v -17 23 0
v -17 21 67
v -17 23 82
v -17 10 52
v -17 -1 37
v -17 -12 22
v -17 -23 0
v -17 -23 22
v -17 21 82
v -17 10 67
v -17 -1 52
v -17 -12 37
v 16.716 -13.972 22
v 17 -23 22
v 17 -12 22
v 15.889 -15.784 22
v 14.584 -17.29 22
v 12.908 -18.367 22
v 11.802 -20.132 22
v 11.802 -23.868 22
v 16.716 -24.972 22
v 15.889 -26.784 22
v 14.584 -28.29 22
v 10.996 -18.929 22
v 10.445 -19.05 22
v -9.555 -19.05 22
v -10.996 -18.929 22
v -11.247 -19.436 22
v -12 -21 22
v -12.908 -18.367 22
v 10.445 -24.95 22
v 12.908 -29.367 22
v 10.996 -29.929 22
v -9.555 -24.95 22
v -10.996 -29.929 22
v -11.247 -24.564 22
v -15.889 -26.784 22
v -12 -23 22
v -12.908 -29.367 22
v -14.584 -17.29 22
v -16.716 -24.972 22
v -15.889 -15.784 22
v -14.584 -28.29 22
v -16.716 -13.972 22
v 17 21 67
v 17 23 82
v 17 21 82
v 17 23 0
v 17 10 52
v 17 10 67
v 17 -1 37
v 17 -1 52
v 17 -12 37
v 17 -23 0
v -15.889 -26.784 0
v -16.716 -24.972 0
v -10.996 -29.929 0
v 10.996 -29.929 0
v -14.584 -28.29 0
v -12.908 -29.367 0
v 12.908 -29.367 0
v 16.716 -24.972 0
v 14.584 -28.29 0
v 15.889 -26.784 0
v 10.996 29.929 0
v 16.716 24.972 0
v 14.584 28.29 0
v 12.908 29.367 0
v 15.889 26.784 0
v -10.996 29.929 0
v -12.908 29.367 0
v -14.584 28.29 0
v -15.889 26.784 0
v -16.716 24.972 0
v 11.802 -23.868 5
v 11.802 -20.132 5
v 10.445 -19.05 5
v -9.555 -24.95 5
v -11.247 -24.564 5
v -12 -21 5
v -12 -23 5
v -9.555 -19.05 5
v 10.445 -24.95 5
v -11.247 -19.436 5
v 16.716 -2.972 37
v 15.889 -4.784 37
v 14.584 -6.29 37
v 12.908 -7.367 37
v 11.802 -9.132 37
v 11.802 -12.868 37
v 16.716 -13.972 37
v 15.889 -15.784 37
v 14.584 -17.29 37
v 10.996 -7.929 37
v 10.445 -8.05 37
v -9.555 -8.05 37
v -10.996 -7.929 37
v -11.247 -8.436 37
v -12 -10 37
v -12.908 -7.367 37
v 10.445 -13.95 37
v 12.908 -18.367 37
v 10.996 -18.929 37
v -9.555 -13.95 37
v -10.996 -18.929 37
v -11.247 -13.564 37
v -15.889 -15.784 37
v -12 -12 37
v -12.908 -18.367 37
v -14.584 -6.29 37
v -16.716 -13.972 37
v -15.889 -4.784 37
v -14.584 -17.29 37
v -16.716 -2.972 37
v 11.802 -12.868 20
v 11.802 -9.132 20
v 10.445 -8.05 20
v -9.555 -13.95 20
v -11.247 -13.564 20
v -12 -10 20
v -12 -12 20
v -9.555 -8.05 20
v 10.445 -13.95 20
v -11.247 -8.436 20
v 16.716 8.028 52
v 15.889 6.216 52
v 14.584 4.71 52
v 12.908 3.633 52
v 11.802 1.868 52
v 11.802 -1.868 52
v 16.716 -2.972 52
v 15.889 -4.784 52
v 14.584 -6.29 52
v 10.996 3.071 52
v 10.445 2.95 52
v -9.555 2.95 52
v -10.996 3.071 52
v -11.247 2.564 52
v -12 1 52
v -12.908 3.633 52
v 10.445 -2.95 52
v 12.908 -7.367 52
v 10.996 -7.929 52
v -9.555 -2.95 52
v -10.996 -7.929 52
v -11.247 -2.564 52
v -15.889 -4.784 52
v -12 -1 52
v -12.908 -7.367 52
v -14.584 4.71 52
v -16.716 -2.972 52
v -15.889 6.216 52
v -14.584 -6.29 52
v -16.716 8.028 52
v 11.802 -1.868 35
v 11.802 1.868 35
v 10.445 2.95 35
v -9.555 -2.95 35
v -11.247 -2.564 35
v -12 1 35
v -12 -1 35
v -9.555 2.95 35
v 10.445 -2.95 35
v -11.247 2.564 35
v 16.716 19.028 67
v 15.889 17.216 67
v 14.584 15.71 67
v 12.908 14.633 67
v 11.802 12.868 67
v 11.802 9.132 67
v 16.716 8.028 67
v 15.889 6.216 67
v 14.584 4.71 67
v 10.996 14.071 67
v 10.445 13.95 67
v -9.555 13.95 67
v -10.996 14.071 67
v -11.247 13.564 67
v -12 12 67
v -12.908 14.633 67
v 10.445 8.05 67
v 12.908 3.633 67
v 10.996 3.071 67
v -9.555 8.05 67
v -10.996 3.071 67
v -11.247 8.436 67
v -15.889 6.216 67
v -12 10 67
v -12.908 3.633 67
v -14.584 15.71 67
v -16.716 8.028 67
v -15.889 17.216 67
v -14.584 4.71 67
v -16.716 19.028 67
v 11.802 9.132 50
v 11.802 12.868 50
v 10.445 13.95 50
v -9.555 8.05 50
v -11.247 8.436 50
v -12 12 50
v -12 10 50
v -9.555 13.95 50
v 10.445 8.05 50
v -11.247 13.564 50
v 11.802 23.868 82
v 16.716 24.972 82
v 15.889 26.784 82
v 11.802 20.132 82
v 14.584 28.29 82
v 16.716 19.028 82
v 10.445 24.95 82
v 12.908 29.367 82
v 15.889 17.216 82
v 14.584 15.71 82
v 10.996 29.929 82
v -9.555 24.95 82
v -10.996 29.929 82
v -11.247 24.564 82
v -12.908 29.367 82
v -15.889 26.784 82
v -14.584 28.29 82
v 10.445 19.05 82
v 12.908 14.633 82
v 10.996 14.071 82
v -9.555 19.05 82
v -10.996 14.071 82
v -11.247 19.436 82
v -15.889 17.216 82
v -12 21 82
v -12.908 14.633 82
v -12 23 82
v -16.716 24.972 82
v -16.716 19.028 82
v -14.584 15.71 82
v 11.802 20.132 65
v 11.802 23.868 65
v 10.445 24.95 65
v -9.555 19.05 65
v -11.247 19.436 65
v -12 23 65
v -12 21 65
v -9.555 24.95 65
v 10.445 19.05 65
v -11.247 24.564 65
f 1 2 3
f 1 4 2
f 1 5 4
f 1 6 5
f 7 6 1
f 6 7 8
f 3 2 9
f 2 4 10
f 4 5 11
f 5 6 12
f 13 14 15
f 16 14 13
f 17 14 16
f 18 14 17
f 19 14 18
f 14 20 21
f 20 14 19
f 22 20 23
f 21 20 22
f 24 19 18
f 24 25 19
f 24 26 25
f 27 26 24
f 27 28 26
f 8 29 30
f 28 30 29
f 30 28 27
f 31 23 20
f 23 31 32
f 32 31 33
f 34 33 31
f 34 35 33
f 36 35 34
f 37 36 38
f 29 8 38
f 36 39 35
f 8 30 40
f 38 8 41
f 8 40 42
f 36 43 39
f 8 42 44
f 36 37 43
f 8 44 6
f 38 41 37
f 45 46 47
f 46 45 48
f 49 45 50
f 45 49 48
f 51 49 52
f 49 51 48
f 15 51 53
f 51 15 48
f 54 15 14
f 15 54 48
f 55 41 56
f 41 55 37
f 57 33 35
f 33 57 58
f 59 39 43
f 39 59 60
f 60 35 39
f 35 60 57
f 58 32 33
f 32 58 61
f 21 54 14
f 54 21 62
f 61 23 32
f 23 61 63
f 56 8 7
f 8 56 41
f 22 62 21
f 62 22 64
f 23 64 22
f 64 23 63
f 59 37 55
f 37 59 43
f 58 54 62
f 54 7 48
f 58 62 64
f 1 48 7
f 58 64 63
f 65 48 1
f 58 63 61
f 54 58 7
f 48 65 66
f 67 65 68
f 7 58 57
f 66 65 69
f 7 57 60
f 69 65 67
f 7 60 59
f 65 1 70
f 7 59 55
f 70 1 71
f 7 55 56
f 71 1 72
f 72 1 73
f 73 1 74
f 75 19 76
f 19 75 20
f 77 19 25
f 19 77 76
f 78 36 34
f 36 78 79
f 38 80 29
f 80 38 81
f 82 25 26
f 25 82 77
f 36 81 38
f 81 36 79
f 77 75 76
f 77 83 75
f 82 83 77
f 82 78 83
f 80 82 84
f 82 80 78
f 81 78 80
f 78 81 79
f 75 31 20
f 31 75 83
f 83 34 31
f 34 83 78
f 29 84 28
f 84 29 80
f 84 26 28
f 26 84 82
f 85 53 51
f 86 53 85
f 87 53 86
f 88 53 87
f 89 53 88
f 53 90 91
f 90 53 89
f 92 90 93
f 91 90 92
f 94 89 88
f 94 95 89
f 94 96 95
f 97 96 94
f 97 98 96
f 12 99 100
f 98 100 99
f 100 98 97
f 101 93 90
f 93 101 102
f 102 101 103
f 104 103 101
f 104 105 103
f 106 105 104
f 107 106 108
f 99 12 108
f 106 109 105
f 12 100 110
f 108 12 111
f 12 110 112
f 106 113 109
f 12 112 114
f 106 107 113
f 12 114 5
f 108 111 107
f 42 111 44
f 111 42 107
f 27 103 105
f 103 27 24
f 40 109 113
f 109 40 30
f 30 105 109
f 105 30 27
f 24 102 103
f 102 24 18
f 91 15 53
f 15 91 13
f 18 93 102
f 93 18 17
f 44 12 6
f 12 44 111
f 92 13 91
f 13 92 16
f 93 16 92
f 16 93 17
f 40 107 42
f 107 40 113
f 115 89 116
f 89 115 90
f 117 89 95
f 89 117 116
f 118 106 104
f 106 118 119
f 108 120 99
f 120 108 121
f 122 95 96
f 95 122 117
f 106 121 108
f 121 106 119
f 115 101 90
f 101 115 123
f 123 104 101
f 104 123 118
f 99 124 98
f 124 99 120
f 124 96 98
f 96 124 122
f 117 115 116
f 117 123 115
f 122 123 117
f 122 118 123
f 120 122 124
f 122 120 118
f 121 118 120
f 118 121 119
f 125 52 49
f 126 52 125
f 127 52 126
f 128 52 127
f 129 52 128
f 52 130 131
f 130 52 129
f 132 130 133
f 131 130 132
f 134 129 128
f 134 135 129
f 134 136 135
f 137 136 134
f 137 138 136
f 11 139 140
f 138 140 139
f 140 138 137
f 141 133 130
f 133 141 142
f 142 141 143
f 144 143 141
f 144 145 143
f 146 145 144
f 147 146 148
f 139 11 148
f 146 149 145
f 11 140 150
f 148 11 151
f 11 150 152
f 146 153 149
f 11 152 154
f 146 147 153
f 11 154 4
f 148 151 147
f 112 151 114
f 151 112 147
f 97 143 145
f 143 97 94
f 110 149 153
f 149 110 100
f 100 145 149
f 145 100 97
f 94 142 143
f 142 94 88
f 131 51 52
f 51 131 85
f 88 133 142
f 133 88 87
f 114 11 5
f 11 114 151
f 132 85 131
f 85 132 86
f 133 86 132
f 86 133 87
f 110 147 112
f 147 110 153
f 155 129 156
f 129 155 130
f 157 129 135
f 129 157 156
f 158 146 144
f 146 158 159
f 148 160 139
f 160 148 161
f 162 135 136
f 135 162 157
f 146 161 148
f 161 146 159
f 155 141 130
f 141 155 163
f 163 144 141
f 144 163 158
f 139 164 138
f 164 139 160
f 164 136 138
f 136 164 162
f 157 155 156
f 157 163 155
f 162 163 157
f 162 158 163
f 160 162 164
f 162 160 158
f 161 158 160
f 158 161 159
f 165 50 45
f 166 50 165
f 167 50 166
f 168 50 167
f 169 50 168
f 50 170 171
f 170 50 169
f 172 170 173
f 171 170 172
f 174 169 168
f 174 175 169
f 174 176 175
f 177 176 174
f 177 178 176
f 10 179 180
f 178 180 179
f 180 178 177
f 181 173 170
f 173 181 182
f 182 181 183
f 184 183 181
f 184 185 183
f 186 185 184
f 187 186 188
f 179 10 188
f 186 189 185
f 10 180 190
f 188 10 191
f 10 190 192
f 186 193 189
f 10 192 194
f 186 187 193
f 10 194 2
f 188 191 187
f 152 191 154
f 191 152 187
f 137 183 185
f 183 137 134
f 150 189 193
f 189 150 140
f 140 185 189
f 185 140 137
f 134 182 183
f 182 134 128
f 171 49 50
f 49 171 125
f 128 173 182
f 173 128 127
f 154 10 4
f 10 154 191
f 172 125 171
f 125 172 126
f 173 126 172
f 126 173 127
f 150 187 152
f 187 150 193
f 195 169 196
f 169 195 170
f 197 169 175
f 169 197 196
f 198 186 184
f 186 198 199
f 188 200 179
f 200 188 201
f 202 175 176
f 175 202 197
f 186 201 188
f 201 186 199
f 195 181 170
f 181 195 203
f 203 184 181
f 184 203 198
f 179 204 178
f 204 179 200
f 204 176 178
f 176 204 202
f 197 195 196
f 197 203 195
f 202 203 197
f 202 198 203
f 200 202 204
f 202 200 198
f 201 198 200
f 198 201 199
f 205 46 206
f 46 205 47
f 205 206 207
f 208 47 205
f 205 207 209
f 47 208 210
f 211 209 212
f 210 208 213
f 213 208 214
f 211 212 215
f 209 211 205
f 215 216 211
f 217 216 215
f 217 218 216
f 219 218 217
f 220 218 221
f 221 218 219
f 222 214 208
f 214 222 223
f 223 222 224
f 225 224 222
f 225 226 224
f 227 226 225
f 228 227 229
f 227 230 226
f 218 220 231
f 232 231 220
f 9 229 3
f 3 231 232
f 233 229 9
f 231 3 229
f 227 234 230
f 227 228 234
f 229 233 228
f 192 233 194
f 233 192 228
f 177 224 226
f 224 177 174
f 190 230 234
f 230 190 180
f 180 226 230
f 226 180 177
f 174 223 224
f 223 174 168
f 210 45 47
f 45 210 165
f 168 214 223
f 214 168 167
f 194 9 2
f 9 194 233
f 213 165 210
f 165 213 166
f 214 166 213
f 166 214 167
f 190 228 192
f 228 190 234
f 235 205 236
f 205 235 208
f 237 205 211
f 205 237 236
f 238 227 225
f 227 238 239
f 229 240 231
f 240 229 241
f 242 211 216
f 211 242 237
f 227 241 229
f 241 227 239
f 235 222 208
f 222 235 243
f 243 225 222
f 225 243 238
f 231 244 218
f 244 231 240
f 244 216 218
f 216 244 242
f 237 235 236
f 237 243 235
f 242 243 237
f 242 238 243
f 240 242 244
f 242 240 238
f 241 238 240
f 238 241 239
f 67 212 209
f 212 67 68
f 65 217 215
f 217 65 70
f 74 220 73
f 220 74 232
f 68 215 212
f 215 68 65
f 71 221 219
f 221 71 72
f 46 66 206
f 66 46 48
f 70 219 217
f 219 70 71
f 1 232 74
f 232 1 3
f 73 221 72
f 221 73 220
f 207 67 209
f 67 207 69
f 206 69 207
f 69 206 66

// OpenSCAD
/* cardholder.scad 
 *
 * Vypracovani ukolu z predmetu BI-3DT
 * Vojtech Myslivec, FIT CVUT v Praze, 2015
 *
 */


// ramecek, se zaoblenym vrskem
module blok( 
             velikost   = [ 30, 10, 35 ],
             zaobleni   = 1,
             delta      = 10
           ) {
    //hranaty spodek
    cube( velikost - delta*[0,0,1] );
    // zaobleny vrsek
    translate( [0,0,velikost[2]-delta] ) {
        intersection() {
            cube( [velikost[0],velikost[1],delta] );

            // maska -- zaoblene rohy
            pozice      = [ 0, velikost[1], 0 ] + zaobleni*[1,-1,0];
            rozestup_X  = velikost[0] - 2*zaobleni;
            rozestup_Y  = velikost[1];

            translate( pozice ) 
                hull() {
                    for ( i=[0,1], j=[0,1] )
                        translate ( [ i*rozestup_X, -j*rozestup_Y, 0 ] )
                            cylinder( r=zaobleni, h=delta );
                }
        }
    }
}

// dira na kartu
module dira(
            velikost    = [ 20, 5, 25 ],
            spacing     = 1
           ) {
    // vnitrni dira je zaoblena, ale spodni strana je rovna
    if ( spacing == 0 ) {
        cube( velikost );
    }
    else {
        hull() {
            for ( i=[0,1], j=[0,1] )
                translate([ i*velikost[0], j*velikost[1], 0 ])
                    cylinder( r=spacing, h=velikost[2] );
        }
    }
}

// prihradka na jednu kartu s podstavcem
module prihradka(
                    blok_velikost    = [ 25, 5, 30 ],
                    dira_velikost    = [ 21, 1, 29 ],
                    spacing     = 1,
                    thickness   = 1,
                    delta       = 10,
                    uroven      = 0
                ) {
    if ( blok_velikost[2] > 0 || uroven != 0 ) { 
        // posun diry oproti bloku
        stred_X = ( blok_velikost[0] - dira_velikost[0] )/2;
        stred_Y = ( blok_velikost[1] - dira_velikost[1] )/2;
        posun = [ stred_X, stred_Y, thickness ];
        // celkova velikost podstavce
        podstavec = delta*uroven;

        // posunuti prihradky na danou uroven
        // rozdil 2 -- duta prihradka
        difference() {
            blok( 
                    velikost    = blok_velikost + [0,0,podstavec],
                    zaobleni    = spacing + thickness,
                    delta       = delta
                );

            // dira
            translate( [ 0, 0, podstavec ]) {
                translate( posun ) {
                    dira(
                            //  vyska je plus 1, aby byla dira videt v nahledu
                            velikost    = dira_velikost + [0,0,1],
                            spacing     = spacing
                        );
                }

            }
        }
    }
}

module drzak (
                    blok_velikost   = [ 25, 5, 30 ],
                    dira_velikost   = [ 21, 1, 29 ],
                    thickness       = 3,
                    spacing         = 1,
                    cards           = 4,
                    delta           = 25,
    ) {
    // celkove vnejsi zaobleni
    zaobleni    = spacing + thickness;

    // posun dalsi prihradky -- velikost - thickness
    posun_prihradky_Y = blok_velikost[1]-thickness;

    // rozmery masky (celkova velikost objektu) -- vyska a rozestupy valcu
    maska_vyska      = blok_velikost[2] + (cards-1)*delta;
    maska_rozestup_X = blok_velikost[0] - 2*zaobleni;
    maska_rozestup_Y = cards*posun_prihradky_Y + thickness - 2*zaobleni;
    maska_pozice     = zaobleni*[1,1,0] - [ 0, (cards-1)*posun_prihradky_Y, 0 ]; 

    intersection() { 
        // pro kazdou kartu vygeneruje prihradku vlastnim modulem
        for ( i = [0:cards-1] ) {
            translate([ 0, 0-i*posun_prihradky_Y, 0 ]) {
                prihradka( 
                            blok_velikost   = blok_velikost,
                            dira_velikost   = dira_velikost,
                            spacing         = spacing,
                            thickness       = thickness,
                            delta           = delta,
                            uroven          = i
                         );
            }
        }

        // maska -- zaoblene rohy
        translate ( maska_pozice ) {
            hull() {
                for ( i=[0,1], j=[0,1] )
                    translate([ i*maska_rozestup_X, j*maska_rozestup_Y, 0 ])
                        cylinder( r=zaobleni, h=maska_vyska );
            }
        }
    }
}

module karta( size = [20,10,5] ) {
    color( "green" ) 
            cube( [ size[1], size[2], size[0] ] );
}

module cardholder(
                    size        = [ 85, 54, 1 ],
                    thickness   = 3,
                    spacing     = 1,
                    cards       = 4,
                    delta       = 25,
                    visibility  = 0.3
        ) { 

    // kvuli osklivemu testu
    size = concat( size, 0 );
    // TODO kontrola, ze size je vektor alespon 2 hodnot. 
    if ( size[0] > 0 && size[1] > 0 && size[2] >= 0 && cards > 0 ) {

        // oprava otoceni dle zadani
        rotate([0,0,180])
            // hnusny if, kvuli zadani
            if ( delta < 0 ) {
                // diky oprave otoceni se objekt otoci, kdyz je znovu zavolan
                //rotate([0,0,180])
                //translate(-[0,0,thickness + spacing + (1-cards)*delta])
                cardholder( size, thickness, spacing, cards, -delta, visibility );
            }
            else {
                // okrajove hodnoty
                spacing         =   spacing > 0 ?   spacing: 0;
                thickness       = thickness > 0 ? thickness: 0;
                viditelnost_max =      ( visibility > 1 ) ? 1 :      visibility;
                viditelnost     = ( viditelnost_max < 0 ) ? 0 : viditelnost_max;

                // celkove vnejsi zaobleni
                zaobleni    = spacing + thickness;

                // rozmery jedne prihradky
                dira_velikost   = [ size[1], size[2], (1-viditelnost) * size[0] + spacing ];
                blok_velikost   = dira_velikost + 2*zaobleni*[1,1,0] + [0,0,thickness];

                // oprava pozice dle zadani
                oprava_pozice_X = -1/2*blok_velikost[0];
                // pro liche je y jeste posunuta
                oprava_pozice_Y = -blok_velikost[1] + (cards*(blok_velikost[1]-thickness) + thickness)/2; 
                oprava_pozice   = [ oprava_pozice_X, oprava_pozice_Y, 0 ];

                translate( oprava_pozice ) {
                    // demo karta
                    %translate( zaobleni*[1,1,1] )
                        karta( size=size );

                    drzak(
                            blok_velikost   = blok_velikost,
                            dira_velikost   = dira_velikost,
                            thickness       = thickness,
                            spacing         = spacing,
                            cards           = cards,
                            delta           = delta
                         );
                }
            }
    }
}

//translate([0,100,0]) cardholder( );
cardholder( 
            size        = [30,20,2],//[80,40,5],
            spacing     = 2,
            cards       = 5,
            thickness   = 5,
            visibility  = 0.5,
            delta       = 15
          );

//prihradka( celkova_velikost=[451,100,700], vnitrni_velikost=[350,10,600], spacing=30, delta=100, uroven=1  );
